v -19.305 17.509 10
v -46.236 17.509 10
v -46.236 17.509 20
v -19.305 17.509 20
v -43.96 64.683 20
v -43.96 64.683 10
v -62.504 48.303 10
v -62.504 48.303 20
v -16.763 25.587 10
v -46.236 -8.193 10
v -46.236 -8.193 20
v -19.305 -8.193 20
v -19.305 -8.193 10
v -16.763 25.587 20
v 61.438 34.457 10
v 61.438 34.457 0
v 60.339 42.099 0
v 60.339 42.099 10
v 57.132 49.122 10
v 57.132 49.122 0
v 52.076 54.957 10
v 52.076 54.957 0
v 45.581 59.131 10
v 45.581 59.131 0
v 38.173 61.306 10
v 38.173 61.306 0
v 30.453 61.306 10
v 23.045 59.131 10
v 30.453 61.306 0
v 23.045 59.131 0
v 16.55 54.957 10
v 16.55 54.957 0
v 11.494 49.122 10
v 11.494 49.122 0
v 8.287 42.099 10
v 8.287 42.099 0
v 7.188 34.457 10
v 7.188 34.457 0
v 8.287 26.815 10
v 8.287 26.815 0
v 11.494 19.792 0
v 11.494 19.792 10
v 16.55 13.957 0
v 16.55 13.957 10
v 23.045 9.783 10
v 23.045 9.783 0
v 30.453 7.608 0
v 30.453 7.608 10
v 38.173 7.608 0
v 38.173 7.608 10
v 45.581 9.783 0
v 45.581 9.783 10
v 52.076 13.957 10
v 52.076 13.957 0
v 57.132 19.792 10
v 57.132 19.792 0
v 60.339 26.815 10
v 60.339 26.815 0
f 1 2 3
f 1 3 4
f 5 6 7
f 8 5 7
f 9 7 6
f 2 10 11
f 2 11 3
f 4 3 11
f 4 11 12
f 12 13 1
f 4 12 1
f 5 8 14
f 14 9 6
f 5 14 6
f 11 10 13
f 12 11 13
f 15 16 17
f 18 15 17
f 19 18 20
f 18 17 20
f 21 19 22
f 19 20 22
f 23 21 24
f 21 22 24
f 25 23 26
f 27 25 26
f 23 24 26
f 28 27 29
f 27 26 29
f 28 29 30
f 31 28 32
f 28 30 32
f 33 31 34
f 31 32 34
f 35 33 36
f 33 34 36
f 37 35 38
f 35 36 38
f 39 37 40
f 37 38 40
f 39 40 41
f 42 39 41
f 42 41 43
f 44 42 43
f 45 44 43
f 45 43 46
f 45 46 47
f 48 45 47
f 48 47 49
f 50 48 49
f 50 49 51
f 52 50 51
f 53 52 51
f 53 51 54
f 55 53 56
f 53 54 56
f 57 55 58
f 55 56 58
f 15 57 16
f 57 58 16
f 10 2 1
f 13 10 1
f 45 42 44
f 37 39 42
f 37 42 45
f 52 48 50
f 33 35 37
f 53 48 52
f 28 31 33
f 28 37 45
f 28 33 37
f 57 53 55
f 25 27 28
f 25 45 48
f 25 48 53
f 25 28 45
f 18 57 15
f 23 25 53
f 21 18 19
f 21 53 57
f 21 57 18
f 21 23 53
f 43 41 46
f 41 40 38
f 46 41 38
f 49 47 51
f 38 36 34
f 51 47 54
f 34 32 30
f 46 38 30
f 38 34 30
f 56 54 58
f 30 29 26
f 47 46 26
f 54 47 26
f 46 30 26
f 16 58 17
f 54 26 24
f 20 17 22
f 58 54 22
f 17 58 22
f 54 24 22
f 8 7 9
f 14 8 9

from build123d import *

# Parameters (mm, degrees)
SKETCH1_R           = 27.12492427
BOSS_EXTRUDE1_DEPTH = 10
SKETCH2_W           = 26.93082218
SKETCH2_H           = 25.702398712
BOSS_EXTRUDE2_DEPTH = 10
BOSS_EXTRUDE3_DEPTH = 10


with BuildPart() as part:
    # Sketch1 → Boss-Extrude1 (new body)
    with BuildSketch(Plane.XY):
        with Locations((34.312919793, 34.457095292)):
            Circle(SKETCH1_R)
    extrude(amount=BOSS_EXTRUDE1_DEPTH)


with BuildPart() as body_2:
    # Sketch2 → Boss-Extrude2 (new body)
    with BuildSketch(Plane.XY.offset(10)):
        with Locations((-32.770372386, 4.658042558)):
            Rectangle(SKETCH2_W, SKETCH2_H)
    extrude(amount=BOSS_EXTRUDE2_DEPTH)


with BuildPart() as body_3:
    # Sketch3 → Boss-Extrude3 (new body)
    with BuildSketch(Plane.XY.offset(10)):
        Polygon((-43.960387264, 64.682988273), (-62.503954018, 48.302837641), (-16.763156025, 25.586968367), align=None)
    extrude(amount=BOSS_EXTRUDE3_DEPTH)


solid = Compound([part.part, body_2.part, body_3.part])
